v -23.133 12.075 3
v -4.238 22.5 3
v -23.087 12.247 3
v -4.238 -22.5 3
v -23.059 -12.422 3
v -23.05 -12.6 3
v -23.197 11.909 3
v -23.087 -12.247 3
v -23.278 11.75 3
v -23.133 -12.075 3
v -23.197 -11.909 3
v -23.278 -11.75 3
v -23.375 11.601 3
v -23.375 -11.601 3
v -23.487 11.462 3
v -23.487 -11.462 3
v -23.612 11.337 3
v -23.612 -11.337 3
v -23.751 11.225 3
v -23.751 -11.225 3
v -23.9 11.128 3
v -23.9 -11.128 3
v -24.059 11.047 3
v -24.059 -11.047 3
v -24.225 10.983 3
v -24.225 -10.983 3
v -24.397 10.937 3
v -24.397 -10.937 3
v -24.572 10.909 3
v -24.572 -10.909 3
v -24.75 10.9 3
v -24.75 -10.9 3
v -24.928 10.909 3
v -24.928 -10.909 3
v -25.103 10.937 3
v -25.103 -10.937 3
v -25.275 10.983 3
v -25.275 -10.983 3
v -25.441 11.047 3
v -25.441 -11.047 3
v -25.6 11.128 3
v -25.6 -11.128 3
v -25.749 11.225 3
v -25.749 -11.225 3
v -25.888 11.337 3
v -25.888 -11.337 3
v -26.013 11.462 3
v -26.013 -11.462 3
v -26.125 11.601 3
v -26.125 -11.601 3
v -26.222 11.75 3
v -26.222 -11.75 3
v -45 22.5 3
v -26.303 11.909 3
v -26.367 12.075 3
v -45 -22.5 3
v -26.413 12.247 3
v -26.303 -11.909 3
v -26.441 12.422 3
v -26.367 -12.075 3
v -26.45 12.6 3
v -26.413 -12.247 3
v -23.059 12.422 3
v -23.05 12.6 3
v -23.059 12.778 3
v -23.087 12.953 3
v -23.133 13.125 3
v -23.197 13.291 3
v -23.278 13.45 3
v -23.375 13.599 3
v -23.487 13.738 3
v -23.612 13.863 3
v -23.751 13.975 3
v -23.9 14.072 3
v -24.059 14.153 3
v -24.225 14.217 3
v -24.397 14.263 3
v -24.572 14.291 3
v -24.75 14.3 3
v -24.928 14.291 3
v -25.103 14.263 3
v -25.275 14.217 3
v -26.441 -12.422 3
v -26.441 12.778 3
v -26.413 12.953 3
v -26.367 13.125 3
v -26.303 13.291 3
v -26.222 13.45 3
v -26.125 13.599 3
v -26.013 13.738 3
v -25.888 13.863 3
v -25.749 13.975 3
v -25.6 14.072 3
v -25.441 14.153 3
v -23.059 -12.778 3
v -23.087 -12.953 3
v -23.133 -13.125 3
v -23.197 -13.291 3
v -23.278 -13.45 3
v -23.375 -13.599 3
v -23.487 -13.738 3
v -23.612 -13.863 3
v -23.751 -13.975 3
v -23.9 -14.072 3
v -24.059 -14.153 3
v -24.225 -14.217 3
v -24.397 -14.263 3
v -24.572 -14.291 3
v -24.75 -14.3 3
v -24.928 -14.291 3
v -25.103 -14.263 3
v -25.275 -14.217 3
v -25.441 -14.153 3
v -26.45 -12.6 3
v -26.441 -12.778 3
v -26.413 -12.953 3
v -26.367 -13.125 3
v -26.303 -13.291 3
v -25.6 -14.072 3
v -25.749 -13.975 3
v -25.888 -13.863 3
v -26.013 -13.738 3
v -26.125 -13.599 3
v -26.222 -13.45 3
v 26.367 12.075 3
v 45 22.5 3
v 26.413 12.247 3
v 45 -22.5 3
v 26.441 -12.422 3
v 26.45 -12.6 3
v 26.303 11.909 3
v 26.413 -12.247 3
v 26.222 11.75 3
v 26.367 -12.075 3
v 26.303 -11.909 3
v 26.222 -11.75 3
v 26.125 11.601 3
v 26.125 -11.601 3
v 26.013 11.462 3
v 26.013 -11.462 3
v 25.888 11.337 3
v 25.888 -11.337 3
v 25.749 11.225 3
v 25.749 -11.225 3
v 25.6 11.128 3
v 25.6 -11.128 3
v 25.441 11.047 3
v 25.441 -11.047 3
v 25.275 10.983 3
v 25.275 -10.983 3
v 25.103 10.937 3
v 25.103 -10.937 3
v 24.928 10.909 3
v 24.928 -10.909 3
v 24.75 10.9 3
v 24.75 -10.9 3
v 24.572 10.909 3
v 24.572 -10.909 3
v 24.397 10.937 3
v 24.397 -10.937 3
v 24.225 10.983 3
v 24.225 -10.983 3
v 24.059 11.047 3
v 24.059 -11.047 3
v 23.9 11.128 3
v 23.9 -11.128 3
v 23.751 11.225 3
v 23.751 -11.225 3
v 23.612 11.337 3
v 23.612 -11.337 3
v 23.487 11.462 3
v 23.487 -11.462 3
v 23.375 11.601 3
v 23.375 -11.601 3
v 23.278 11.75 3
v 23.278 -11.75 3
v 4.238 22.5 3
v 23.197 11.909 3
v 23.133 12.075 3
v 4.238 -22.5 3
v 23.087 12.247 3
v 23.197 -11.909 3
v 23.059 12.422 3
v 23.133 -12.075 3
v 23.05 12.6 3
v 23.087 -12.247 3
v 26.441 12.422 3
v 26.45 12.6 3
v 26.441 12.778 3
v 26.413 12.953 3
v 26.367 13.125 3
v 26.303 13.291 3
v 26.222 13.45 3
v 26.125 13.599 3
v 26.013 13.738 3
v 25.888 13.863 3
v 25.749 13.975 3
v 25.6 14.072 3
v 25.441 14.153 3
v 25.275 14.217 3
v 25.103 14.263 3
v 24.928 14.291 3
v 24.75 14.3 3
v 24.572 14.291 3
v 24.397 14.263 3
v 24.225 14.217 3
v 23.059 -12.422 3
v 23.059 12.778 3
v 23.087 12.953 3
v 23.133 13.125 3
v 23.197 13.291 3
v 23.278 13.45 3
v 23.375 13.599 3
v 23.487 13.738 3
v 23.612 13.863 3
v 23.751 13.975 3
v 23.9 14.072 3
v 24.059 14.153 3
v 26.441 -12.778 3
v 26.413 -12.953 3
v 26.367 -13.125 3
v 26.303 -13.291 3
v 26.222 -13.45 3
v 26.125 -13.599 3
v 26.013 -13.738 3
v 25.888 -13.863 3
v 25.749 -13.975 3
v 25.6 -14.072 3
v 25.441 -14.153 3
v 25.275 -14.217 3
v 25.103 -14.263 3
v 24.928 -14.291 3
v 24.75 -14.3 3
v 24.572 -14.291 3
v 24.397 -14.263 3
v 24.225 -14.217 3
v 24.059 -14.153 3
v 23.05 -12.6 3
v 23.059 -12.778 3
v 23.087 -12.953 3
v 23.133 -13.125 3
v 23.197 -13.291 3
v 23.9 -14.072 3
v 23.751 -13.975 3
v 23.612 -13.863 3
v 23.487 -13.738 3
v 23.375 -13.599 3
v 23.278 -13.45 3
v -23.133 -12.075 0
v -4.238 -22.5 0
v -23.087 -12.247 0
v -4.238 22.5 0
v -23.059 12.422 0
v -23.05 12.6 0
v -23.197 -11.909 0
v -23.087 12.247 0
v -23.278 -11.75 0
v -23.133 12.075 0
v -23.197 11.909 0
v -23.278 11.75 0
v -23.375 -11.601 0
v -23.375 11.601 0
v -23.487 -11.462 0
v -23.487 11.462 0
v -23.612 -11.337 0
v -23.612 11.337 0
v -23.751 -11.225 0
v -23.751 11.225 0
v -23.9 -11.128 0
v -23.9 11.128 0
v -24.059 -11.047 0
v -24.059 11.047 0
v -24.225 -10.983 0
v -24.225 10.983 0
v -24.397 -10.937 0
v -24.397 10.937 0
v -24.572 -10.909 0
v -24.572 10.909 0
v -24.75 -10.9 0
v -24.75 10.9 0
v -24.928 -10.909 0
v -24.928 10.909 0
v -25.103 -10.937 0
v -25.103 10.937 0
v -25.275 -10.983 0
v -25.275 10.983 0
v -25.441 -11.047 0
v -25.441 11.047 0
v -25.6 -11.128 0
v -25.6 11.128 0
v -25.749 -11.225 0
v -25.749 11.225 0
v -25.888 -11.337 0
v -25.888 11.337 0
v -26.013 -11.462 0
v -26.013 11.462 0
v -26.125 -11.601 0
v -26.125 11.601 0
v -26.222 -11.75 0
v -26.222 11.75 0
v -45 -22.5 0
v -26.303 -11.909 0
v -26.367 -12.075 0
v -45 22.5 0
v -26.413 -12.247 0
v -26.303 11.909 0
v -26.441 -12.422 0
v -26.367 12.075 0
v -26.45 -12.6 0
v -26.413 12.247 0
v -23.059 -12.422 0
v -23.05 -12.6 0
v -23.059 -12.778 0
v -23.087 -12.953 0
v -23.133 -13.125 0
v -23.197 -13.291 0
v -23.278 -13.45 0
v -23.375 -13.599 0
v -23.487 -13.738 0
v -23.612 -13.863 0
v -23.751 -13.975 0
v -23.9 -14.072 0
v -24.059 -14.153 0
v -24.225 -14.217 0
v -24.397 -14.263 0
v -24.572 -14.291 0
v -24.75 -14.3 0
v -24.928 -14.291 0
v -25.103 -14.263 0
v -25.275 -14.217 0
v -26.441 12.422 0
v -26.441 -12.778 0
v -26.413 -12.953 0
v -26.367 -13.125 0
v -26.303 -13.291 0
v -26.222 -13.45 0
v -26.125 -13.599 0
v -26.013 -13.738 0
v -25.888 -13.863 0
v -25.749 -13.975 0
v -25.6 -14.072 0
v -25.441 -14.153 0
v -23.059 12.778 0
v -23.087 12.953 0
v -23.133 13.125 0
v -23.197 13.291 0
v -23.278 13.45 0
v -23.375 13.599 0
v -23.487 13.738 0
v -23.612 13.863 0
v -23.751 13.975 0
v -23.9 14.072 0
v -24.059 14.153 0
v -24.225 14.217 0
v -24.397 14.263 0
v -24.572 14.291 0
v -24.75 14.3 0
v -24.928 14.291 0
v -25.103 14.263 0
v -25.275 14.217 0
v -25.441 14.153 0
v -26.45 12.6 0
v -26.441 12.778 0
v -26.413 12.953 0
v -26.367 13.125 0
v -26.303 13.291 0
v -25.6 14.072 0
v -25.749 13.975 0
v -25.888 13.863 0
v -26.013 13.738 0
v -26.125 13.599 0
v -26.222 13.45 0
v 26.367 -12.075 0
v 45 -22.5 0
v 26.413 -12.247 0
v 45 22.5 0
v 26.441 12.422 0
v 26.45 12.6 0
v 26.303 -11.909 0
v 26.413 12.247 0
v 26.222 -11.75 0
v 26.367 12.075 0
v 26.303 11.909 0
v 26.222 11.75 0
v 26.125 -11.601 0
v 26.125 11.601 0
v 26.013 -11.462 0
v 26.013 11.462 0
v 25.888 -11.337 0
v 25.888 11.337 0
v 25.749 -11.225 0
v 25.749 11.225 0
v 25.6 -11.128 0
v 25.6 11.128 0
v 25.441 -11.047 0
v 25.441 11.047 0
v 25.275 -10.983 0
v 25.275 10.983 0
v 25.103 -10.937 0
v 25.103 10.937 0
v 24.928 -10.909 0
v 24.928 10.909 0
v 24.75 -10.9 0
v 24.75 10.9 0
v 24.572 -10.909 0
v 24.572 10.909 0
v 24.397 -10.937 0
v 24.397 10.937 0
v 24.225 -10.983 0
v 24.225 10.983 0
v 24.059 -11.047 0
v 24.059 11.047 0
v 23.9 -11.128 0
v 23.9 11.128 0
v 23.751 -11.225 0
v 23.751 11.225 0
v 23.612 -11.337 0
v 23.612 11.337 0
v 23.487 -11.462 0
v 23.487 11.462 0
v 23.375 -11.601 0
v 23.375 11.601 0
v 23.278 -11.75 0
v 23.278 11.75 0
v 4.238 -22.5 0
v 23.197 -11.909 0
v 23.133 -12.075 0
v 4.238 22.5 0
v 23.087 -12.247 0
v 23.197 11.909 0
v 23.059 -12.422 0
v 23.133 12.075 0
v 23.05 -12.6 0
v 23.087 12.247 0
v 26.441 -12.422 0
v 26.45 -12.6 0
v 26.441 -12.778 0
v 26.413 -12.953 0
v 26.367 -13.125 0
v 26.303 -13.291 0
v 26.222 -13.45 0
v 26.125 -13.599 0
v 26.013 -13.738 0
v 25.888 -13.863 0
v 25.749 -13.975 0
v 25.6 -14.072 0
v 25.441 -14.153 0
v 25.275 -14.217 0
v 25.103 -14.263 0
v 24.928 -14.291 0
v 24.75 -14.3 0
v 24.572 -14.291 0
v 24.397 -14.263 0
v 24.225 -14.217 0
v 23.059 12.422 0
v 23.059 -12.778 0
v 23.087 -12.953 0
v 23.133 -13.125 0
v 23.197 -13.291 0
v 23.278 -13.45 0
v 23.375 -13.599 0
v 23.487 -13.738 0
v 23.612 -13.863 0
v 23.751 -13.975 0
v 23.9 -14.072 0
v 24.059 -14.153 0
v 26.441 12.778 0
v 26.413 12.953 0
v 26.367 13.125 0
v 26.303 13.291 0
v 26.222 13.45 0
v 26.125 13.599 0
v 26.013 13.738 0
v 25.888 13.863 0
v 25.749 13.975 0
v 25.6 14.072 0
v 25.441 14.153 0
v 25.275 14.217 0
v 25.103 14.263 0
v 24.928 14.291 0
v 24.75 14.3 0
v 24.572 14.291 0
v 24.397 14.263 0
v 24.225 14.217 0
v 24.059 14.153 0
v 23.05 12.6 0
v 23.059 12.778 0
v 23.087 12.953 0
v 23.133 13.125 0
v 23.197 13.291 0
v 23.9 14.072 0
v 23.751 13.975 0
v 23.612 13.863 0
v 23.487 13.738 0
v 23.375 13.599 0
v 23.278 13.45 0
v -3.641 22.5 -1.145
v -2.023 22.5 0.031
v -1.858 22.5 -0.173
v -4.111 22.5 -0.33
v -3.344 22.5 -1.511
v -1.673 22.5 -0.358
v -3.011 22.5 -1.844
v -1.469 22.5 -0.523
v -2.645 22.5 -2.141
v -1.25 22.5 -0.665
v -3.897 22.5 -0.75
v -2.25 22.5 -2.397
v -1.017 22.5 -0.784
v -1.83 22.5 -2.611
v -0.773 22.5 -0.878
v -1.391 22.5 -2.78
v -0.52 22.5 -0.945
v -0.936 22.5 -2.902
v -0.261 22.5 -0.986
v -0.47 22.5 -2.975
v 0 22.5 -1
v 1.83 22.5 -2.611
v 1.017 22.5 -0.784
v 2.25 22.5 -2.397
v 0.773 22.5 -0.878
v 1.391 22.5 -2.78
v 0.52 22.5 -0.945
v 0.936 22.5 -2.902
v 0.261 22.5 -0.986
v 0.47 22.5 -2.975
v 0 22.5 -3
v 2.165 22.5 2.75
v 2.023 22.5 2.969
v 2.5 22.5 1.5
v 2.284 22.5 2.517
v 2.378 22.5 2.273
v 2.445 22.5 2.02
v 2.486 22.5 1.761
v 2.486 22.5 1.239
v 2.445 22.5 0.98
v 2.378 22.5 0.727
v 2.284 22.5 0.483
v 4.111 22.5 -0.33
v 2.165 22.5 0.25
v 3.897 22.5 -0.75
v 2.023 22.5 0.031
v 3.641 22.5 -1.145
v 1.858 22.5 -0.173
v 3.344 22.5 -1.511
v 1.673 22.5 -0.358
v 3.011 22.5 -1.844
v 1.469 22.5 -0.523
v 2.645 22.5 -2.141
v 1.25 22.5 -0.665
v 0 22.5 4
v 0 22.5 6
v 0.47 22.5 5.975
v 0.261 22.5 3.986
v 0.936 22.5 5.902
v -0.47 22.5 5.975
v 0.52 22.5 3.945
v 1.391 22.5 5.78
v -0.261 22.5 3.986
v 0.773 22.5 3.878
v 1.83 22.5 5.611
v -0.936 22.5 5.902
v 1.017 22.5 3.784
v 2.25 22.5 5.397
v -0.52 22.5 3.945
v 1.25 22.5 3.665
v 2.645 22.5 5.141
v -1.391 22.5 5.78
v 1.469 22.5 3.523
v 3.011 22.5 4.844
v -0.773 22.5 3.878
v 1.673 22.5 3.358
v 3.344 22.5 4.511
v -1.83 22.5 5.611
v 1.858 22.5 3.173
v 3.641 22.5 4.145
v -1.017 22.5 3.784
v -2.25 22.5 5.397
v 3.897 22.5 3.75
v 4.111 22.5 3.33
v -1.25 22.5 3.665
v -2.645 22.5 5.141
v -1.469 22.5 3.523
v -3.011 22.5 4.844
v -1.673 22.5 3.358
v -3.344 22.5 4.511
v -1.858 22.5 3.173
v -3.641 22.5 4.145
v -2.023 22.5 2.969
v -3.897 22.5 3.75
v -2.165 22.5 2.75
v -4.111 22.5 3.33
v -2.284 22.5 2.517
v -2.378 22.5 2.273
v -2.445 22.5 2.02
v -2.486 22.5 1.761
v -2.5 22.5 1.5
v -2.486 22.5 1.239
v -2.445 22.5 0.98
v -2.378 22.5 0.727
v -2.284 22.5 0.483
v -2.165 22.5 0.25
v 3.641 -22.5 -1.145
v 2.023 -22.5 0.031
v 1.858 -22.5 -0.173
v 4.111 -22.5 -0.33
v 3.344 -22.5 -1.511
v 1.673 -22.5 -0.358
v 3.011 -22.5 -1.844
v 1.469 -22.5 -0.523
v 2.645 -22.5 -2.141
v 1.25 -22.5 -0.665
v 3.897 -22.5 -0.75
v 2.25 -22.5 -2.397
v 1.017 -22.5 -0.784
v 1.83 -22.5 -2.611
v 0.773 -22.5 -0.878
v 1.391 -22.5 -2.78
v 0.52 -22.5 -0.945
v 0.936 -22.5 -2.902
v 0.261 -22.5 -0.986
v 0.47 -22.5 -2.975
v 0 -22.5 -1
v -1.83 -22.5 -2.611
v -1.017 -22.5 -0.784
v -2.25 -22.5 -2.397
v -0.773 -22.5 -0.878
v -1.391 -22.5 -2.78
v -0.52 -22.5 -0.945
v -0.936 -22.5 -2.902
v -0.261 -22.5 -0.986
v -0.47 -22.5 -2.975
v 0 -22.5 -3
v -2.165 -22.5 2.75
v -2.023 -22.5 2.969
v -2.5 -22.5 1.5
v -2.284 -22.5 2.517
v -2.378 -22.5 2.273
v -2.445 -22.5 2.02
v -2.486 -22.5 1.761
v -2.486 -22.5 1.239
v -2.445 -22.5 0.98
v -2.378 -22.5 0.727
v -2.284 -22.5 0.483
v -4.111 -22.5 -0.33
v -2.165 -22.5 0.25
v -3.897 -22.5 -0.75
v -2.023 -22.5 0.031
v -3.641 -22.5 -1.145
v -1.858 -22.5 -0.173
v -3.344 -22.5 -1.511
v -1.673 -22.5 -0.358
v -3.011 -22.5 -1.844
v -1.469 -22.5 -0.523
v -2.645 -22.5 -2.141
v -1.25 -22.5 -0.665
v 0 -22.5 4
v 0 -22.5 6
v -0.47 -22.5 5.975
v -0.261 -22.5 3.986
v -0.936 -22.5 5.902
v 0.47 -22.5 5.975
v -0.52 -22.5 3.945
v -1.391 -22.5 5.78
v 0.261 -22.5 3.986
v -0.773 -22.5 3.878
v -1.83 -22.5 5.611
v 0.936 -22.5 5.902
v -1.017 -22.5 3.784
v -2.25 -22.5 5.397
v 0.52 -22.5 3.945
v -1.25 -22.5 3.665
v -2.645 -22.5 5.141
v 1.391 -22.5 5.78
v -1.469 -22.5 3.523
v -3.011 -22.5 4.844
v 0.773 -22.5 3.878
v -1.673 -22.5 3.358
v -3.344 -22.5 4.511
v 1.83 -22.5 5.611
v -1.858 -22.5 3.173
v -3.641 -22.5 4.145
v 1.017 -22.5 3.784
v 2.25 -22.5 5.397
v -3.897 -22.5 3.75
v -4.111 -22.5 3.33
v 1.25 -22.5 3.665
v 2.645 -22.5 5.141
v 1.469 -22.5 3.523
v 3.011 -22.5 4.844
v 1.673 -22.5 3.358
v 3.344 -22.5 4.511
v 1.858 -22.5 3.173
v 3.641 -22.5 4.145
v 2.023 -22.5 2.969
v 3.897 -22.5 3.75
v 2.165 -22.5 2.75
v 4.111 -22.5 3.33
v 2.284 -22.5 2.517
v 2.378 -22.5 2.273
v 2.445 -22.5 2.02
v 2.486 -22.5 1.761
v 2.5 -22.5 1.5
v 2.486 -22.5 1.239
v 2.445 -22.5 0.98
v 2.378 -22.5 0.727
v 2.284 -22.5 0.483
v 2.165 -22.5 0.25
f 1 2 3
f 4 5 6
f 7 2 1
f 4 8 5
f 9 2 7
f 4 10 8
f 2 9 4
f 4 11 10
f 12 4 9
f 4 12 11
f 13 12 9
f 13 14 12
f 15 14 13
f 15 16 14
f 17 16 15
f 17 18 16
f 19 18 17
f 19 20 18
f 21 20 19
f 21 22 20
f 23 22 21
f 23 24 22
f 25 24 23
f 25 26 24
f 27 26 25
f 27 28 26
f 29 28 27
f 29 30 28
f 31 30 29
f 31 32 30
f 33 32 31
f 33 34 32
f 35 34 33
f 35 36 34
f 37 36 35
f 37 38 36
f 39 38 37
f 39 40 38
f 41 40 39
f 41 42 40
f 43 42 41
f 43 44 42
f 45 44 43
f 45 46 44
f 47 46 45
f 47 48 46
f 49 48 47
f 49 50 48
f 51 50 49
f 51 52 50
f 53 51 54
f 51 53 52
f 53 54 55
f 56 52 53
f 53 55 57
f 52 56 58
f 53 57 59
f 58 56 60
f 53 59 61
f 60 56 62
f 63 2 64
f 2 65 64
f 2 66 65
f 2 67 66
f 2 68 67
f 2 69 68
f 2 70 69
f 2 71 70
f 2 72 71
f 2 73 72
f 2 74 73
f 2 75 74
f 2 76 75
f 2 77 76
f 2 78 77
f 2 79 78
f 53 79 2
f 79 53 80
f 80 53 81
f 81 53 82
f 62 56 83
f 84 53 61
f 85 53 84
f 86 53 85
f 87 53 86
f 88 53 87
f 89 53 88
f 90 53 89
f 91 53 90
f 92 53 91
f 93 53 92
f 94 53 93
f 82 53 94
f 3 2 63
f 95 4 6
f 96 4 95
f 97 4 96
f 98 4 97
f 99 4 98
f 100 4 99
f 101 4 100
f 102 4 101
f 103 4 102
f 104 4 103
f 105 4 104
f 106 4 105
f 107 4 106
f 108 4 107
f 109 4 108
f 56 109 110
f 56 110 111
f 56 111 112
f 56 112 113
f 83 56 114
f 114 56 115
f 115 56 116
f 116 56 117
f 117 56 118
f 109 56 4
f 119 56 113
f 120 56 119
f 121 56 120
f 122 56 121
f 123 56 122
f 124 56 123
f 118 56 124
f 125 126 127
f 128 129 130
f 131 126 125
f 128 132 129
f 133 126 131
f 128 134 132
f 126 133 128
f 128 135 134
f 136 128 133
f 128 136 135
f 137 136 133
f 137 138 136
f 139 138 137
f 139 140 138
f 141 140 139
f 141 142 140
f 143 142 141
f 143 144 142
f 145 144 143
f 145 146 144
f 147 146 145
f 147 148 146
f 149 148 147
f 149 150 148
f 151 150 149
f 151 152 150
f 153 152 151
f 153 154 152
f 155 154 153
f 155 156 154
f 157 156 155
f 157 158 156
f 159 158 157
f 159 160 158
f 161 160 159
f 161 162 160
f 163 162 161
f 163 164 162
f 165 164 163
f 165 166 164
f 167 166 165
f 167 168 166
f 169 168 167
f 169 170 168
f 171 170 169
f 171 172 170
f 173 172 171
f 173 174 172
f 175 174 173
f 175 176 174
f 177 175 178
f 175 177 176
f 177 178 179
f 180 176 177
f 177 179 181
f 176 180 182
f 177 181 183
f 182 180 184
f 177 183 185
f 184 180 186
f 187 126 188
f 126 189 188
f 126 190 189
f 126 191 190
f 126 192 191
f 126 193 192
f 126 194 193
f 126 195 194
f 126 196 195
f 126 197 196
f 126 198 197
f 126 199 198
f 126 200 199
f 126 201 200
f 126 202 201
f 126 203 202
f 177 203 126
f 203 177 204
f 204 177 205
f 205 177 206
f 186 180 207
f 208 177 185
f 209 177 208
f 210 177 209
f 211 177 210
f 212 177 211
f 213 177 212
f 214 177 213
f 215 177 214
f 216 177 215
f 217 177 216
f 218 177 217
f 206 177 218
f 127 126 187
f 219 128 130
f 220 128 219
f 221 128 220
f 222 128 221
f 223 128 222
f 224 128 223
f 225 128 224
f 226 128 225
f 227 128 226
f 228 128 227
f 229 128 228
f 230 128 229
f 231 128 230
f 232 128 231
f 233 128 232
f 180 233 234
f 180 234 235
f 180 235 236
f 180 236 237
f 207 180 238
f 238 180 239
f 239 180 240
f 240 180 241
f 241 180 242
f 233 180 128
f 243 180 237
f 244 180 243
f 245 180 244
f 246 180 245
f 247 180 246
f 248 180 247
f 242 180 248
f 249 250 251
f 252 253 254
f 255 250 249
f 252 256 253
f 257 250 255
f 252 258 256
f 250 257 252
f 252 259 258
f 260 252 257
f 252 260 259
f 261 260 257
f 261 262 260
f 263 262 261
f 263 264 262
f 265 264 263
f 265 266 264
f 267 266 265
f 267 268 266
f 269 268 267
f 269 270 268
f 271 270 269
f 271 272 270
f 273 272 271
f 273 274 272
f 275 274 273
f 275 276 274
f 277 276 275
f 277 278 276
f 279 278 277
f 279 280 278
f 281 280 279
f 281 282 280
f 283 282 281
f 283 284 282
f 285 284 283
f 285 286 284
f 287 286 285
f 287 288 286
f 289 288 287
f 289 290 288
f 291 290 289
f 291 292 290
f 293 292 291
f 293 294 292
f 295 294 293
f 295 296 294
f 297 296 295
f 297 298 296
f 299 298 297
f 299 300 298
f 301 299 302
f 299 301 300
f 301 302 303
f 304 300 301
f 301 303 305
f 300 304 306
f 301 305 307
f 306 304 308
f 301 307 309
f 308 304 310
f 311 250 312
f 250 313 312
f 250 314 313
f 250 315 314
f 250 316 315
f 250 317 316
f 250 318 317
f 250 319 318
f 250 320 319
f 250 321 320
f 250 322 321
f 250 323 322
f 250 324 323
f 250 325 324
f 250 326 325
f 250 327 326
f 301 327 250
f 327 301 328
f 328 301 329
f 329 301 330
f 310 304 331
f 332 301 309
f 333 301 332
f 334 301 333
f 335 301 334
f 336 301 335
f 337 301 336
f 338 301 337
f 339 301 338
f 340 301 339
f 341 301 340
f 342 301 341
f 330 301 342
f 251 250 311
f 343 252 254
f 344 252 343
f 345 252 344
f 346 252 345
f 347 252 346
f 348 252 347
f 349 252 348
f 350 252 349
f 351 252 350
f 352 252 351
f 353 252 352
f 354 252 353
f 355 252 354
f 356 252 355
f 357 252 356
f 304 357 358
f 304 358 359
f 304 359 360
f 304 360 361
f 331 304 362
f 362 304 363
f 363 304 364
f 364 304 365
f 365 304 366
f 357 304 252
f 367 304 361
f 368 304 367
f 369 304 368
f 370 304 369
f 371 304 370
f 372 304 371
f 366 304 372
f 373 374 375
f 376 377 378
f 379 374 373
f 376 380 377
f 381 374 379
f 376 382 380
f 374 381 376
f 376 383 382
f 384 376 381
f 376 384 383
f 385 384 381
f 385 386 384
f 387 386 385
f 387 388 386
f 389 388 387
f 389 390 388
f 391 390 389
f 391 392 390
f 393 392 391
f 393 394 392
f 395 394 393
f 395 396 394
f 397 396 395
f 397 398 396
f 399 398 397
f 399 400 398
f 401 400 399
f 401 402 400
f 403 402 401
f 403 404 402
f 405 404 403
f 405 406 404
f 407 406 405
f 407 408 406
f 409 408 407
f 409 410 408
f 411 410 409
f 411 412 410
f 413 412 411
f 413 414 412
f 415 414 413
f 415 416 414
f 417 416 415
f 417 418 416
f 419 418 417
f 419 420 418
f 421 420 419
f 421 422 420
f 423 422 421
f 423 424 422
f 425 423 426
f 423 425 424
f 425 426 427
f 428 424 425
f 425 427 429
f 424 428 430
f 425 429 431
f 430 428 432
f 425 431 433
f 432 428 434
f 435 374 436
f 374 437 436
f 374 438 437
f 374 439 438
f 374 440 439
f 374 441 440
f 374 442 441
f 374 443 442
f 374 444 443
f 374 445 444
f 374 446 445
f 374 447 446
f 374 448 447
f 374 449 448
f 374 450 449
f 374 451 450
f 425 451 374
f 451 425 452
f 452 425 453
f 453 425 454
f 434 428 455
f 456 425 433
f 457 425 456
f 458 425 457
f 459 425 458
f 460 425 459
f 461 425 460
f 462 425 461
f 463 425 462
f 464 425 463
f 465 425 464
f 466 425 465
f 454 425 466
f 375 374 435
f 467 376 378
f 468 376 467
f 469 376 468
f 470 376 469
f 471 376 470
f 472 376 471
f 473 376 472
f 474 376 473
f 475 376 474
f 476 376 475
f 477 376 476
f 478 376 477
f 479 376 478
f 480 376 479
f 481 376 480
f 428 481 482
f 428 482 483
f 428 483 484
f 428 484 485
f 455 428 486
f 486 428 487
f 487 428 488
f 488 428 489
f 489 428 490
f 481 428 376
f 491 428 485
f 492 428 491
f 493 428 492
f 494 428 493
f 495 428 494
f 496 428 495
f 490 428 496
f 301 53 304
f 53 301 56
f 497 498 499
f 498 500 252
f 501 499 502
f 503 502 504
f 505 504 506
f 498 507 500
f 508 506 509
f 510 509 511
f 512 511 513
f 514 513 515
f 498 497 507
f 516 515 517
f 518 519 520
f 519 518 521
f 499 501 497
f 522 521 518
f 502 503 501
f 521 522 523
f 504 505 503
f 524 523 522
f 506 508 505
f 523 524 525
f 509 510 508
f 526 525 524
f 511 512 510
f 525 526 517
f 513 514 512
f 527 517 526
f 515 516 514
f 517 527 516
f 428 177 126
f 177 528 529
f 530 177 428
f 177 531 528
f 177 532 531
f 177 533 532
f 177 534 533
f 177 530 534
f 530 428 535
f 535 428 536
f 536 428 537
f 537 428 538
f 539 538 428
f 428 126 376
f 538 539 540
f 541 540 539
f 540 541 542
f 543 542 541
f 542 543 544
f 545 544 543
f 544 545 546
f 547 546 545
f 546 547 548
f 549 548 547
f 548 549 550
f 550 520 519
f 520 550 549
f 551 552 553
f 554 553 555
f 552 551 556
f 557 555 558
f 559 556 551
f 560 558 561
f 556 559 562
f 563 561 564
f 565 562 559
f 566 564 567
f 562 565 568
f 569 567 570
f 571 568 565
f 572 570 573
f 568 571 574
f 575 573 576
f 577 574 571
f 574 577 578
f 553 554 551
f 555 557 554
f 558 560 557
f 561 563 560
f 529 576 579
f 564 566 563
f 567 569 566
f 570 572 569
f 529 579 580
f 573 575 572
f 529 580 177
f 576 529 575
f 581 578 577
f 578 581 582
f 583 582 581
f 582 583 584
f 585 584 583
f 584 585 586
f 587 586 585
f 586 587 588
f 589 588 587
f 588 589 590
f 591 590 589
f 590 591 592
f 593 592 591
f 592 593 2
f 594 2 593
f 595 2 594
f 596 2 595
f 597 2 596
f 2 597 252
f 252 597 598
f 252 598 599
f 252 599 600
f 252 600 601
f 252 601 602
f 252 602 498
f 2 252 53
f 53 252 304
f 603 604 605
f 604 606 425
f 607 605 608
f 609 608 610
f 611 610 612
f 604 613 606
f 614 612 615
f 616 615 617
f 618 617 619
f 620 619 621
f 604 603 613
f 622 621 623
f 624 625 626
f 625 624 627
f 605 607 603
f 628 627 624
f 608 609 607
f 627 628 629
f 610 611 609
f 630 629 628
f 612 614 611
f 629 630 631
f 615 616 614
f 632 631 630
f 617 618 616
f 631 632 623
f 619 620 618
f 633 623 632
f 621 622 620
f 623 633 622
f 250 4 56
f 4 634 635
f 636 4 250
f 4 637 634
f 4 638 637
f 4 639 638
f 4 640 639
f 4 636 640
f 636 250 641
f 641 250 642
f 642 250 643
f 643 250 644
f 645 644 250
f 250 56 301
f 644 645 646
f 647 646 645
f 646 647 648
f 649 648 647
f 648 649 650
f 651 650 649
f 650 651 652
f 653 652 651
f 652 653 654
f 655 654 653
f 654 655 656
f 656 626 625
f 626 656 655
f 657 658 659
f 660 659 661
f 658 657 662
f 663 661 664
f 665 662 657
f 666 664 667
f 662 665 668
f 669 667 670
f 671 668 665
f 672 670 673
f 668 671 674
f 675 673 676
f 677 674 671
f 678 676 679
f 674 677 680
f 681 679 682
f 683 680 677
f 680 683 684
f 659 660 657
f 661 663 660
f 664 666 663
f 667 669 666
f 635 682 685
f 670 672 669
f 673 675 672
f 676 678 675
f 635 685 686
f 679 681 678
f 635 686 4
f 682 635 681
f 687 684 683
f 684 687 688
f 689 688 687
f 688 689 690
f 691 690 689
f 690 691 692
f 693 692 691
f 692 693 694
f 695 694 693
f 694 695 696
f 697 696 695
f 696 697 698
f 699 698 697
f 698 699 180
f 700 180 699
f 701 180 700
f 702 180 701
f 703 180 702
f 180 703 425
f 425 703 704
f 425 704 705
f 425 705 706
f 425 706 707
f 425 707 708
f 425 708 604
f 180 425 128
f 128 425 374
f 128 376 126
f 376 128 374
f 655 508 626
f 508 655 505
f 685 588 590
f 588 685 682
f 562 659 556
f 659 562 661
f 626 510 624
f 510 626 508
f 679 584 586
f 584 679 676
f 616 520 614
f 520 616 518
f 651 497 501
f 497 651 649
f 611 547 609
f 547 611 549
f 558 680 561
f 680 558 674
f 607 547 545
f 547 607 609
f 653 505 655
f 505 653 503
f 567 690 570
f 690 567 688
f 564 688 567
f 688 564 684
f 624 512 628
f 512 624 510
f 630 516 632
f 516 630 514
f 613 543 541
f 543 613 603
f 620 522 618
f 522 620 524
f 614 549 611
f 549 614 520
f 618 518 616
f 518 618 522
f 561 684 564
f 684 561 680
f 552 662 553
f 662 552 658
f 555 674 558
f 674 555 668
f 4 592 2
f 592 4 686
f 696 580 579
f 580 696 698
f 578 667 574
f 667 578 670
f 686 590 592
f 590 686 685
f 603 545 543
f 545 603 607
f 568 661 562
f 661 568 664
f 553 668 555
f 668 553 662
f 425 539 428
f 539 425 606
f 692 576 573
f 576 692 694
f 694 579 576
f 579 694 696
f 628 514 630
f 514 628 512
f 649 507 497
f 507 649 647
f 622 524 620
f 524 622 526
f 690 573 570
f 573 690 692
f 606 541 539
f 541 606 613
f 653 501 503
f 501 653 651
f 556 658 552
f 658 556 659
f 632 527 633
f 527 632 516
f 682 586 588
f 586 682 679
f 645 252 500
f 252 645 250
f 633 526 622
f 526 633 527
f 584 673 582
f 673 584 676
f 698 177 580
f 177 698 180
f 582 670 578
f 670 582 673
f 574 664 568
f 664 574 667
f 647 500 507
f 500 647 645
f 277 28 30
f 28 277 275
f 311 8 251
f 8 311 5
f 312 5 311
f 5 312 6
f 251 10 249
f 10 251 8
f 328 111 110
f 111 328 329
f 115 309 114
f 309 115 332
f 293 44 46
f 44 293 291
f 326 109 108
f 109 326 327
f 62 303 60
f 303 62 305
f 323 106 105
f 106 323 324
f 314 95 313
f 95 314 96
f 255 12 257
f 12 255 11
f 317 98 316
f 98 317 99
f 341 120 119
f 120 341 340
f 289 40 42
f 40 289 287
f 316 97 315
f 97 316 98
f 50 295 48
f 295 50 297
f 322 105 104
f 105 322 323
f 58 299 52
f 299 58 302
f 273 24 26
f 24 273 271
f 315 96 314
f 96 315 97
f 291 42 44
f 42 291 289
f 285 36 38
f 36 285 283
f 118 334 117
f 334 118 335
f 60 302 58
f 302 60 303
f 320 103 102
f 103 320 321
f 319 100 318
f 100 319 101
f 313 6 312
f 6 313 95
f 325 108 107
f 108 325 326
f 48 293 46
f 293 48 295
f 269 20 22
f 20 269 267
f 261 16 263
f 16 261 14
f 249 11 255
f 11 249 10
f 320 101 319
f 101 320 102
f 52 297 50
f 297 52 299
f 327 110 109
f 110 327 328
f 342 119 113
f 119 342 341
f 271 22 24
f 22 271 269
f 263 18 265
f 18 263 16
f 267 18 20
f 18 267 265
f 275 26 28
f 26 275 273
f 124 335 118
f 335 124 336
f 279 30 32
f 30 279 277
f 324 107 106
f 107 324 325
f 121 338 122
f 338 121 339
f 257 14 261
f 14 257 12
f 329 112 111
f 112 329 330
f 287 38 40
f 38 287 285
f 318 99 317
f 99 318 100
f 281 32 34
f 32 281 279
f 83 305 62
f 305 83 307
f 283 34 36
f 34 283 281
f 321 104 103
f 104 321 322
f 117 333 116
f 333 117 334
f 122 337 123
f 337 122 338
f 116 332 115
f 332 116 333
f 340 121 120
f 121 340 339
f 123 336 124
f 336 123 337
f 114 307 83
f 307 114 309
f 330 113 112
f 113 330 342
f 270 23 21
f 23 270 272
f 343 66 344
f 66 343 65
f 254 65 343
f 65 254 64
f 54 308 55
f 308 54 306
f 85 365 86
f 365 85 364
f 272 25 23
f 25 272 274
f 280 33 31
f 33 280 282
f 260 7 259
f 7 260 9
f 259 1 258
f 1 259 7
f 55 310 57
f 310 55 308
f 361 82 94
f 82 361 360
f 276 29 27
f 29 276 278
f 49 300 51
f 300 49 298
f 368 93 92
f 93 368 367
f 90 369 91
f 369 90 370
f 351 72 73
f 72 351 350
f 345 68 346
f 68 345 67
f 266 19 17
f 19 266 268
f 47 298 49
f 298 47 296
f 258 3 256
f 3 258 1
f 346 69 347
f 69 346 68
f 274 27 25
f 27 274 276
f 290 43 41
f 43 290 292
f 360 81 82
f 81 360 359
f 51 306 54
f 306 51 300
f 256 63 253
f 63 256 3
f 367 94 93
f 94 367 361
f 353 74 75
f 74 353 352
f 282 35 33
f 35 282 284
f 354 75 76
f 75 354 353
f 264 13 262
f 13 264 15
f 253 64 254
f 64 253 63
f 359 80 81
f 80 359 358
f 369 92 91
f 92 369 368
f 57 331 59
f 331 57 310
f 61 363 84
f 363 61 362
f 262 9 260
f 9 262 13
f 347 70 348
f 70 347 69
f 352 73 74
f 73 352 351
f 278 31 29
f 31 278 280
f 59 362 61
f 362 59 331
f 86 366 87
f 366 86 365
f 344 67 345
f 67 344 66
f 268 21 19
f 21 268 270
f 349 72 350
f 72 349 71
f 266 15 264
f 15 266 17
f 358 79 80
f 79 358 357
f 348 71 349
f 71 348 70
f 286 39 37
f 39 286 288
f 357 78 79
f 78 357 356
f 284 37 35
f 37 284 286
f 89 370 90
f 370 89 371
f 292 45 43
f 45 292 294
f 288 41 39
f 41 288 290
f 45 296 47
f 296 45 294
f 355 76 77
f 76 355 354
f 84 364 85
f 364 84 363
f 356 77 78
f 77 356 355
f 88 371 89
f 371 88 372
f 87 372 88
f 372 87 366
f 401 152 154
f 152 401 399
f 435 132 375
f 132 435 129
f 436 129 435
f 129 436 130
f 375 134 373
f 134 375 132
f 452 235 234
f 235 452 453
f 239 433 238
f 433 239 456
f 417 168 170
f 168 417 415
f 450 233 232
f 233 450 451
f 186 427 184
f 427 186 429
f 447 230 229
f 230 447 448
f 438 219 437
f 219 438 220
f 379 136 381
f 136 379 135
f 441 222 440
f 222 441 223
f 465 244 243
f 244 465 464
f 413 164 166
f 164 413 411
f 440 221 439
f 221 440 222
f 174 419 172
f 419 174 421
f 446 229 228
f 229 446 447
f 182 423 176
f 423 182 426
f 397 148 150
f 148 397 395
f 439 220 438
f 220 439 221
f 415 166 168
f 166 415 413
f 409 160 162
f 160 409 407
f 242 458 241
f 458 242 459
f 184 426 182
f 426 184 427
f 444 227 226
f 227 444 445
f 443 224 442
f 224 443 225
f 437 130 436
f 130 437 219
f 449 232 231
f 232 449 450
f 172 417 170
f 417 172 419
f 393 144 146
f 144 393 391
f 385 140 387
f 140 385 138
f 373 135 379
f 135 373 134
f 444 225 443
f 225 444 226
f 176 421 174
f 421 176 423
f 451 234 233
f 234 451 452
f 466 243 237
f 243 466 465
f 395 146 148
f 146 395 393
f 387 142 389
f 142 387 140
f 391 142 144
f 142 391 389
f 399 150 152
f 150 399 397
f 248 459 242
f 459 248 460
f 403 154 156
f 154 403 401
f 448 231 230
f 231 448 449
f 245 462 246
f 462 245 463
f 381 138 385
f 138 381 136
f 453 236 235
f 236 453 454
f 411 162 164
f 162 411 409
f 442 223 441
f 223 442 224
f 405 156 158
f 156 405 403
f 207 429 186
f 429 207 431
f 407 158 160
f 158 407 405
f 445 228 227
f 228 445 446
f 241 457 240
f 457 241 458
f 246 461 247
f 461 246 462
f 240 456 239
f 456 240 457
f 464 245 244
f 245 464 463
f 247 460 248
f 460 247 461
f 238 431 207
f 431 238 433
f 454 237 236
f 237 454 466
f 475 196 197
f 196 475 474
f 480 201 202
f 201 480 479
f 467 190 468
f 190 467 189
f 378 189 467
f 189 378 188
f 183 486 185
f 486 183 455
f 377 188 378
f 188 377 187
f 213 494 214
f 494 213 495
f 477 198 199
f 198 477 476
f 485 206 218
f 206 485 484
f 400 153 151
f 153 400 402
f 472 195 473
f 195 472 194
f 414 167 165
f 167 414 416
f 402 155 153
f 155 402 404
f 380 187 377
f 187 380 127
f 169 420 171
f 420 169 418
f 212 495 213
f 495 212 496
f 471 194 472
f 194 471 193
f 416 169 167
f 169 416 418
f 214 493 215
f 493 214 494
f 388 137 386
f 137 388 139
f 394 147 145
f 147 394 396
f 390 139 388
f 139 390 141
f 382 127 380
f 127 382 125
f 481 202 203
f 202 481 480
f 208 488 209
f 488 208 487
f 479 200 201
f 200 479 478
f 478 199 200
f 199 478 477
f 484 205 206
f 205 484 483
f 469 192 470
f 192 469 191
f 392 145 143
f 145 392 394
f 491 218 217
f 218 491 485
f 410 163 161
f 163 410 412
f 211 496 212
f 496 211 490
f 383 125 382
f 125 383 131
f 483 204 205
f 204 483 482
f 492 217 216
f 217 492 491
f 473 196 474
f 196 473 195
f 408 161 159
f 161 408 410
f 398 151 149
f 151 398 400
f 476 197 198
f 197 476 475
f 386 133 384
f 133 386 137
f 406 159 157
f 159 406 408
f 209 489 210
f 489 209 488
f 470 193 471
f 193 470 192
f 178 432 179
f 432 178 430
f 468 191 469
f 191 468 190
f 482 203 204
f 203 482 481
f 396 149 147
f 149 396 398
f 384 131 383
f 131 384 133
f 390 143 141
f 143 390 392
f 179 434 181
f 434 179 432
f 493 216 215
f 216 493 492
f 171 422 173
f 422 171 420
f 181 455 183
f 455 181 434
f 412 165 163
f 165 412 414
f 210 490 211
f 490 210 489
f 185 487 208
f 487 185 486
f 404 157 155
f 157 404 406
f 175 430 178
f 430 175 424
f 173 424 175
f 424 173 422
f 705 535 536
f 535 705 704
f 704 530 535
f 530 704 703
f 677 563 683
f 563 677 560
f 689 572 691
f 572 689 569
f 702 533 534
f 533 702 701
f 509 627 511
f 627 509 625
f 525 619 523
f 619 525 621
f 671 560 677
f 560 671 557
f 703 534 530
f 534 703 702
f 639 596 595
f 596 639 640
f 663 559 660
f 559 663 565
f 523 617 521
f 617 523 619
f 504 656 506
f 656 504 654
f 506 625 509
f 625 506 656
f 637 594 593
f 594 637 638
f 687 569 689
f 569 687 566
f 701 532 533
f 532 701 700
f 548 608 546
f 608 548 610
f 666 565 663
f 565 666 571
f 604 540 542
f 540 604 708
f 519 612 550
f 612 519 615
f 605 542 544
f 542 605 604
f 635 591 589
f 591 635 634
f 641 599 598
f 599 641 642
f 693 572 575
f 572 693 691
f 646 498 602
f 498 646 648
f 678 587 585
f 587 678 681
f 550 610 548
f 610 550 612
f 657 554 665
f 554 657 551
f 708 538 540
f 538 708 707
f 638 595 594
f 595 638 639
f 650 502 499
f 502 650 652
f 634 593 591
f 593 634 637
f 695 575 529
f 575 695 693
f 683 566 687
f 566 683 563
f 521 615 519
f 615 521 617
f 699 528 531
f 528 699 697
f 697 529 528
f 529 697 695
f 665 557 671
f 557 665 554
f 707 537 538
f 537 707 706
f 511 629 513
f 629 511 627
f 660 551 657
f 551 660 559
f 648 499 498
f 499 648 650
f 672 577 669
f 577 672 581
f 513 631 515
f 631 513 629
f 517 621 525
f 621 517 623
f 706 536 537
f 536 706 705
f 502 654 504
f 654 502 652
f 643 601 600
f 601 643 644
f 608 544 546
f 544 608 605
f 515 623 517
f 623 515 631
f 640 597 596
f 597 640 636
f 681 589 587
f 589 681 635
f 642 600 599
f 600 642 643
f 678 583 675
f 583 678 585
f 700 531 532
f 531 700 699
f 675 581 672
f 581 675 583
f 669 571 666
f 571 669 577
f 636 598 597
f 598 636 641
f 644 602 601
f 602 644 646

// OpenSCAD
// Two-leaf hinge with a printable straight pin barrel.
$fn = 60;
eps = 0.02;
leaf_l = 45;
leaf_w = 45;
leaf_t = 3;
pin_d = 5;
barrel_d = pin_d + 4;
difference() {
    union() {
        translate([-leaf_l, -leaf_w / 2, 0]) cube([leaf_l, leaf_w, leaf_t]);
        translate([0, -leaf_w / 2, 0]) cube([leaf_l, leaf_w, leaf_t]);
        translate([0, -leaf_w / 2, leaf_t / 2]) rotate([-90, 0, 0]) cylinder(d = barrel_d, h = leaf_w);
    }
    translate([0, -leaf_w / 2 - eps, leaf_t / 2]) rotate([-90, 0, 0]) cylinder(d = pin_d, h = leaf_w + 2 * eps);
    for (x = [-leaf_l * 0.55, leaf_l * 0.55], y = [-leaf_w * 0.28, leaf_w * 0.28])
        translate([x, y, -eps]) cylinder(d = 3.4, h = leaf_t + 2 * eps);
}
